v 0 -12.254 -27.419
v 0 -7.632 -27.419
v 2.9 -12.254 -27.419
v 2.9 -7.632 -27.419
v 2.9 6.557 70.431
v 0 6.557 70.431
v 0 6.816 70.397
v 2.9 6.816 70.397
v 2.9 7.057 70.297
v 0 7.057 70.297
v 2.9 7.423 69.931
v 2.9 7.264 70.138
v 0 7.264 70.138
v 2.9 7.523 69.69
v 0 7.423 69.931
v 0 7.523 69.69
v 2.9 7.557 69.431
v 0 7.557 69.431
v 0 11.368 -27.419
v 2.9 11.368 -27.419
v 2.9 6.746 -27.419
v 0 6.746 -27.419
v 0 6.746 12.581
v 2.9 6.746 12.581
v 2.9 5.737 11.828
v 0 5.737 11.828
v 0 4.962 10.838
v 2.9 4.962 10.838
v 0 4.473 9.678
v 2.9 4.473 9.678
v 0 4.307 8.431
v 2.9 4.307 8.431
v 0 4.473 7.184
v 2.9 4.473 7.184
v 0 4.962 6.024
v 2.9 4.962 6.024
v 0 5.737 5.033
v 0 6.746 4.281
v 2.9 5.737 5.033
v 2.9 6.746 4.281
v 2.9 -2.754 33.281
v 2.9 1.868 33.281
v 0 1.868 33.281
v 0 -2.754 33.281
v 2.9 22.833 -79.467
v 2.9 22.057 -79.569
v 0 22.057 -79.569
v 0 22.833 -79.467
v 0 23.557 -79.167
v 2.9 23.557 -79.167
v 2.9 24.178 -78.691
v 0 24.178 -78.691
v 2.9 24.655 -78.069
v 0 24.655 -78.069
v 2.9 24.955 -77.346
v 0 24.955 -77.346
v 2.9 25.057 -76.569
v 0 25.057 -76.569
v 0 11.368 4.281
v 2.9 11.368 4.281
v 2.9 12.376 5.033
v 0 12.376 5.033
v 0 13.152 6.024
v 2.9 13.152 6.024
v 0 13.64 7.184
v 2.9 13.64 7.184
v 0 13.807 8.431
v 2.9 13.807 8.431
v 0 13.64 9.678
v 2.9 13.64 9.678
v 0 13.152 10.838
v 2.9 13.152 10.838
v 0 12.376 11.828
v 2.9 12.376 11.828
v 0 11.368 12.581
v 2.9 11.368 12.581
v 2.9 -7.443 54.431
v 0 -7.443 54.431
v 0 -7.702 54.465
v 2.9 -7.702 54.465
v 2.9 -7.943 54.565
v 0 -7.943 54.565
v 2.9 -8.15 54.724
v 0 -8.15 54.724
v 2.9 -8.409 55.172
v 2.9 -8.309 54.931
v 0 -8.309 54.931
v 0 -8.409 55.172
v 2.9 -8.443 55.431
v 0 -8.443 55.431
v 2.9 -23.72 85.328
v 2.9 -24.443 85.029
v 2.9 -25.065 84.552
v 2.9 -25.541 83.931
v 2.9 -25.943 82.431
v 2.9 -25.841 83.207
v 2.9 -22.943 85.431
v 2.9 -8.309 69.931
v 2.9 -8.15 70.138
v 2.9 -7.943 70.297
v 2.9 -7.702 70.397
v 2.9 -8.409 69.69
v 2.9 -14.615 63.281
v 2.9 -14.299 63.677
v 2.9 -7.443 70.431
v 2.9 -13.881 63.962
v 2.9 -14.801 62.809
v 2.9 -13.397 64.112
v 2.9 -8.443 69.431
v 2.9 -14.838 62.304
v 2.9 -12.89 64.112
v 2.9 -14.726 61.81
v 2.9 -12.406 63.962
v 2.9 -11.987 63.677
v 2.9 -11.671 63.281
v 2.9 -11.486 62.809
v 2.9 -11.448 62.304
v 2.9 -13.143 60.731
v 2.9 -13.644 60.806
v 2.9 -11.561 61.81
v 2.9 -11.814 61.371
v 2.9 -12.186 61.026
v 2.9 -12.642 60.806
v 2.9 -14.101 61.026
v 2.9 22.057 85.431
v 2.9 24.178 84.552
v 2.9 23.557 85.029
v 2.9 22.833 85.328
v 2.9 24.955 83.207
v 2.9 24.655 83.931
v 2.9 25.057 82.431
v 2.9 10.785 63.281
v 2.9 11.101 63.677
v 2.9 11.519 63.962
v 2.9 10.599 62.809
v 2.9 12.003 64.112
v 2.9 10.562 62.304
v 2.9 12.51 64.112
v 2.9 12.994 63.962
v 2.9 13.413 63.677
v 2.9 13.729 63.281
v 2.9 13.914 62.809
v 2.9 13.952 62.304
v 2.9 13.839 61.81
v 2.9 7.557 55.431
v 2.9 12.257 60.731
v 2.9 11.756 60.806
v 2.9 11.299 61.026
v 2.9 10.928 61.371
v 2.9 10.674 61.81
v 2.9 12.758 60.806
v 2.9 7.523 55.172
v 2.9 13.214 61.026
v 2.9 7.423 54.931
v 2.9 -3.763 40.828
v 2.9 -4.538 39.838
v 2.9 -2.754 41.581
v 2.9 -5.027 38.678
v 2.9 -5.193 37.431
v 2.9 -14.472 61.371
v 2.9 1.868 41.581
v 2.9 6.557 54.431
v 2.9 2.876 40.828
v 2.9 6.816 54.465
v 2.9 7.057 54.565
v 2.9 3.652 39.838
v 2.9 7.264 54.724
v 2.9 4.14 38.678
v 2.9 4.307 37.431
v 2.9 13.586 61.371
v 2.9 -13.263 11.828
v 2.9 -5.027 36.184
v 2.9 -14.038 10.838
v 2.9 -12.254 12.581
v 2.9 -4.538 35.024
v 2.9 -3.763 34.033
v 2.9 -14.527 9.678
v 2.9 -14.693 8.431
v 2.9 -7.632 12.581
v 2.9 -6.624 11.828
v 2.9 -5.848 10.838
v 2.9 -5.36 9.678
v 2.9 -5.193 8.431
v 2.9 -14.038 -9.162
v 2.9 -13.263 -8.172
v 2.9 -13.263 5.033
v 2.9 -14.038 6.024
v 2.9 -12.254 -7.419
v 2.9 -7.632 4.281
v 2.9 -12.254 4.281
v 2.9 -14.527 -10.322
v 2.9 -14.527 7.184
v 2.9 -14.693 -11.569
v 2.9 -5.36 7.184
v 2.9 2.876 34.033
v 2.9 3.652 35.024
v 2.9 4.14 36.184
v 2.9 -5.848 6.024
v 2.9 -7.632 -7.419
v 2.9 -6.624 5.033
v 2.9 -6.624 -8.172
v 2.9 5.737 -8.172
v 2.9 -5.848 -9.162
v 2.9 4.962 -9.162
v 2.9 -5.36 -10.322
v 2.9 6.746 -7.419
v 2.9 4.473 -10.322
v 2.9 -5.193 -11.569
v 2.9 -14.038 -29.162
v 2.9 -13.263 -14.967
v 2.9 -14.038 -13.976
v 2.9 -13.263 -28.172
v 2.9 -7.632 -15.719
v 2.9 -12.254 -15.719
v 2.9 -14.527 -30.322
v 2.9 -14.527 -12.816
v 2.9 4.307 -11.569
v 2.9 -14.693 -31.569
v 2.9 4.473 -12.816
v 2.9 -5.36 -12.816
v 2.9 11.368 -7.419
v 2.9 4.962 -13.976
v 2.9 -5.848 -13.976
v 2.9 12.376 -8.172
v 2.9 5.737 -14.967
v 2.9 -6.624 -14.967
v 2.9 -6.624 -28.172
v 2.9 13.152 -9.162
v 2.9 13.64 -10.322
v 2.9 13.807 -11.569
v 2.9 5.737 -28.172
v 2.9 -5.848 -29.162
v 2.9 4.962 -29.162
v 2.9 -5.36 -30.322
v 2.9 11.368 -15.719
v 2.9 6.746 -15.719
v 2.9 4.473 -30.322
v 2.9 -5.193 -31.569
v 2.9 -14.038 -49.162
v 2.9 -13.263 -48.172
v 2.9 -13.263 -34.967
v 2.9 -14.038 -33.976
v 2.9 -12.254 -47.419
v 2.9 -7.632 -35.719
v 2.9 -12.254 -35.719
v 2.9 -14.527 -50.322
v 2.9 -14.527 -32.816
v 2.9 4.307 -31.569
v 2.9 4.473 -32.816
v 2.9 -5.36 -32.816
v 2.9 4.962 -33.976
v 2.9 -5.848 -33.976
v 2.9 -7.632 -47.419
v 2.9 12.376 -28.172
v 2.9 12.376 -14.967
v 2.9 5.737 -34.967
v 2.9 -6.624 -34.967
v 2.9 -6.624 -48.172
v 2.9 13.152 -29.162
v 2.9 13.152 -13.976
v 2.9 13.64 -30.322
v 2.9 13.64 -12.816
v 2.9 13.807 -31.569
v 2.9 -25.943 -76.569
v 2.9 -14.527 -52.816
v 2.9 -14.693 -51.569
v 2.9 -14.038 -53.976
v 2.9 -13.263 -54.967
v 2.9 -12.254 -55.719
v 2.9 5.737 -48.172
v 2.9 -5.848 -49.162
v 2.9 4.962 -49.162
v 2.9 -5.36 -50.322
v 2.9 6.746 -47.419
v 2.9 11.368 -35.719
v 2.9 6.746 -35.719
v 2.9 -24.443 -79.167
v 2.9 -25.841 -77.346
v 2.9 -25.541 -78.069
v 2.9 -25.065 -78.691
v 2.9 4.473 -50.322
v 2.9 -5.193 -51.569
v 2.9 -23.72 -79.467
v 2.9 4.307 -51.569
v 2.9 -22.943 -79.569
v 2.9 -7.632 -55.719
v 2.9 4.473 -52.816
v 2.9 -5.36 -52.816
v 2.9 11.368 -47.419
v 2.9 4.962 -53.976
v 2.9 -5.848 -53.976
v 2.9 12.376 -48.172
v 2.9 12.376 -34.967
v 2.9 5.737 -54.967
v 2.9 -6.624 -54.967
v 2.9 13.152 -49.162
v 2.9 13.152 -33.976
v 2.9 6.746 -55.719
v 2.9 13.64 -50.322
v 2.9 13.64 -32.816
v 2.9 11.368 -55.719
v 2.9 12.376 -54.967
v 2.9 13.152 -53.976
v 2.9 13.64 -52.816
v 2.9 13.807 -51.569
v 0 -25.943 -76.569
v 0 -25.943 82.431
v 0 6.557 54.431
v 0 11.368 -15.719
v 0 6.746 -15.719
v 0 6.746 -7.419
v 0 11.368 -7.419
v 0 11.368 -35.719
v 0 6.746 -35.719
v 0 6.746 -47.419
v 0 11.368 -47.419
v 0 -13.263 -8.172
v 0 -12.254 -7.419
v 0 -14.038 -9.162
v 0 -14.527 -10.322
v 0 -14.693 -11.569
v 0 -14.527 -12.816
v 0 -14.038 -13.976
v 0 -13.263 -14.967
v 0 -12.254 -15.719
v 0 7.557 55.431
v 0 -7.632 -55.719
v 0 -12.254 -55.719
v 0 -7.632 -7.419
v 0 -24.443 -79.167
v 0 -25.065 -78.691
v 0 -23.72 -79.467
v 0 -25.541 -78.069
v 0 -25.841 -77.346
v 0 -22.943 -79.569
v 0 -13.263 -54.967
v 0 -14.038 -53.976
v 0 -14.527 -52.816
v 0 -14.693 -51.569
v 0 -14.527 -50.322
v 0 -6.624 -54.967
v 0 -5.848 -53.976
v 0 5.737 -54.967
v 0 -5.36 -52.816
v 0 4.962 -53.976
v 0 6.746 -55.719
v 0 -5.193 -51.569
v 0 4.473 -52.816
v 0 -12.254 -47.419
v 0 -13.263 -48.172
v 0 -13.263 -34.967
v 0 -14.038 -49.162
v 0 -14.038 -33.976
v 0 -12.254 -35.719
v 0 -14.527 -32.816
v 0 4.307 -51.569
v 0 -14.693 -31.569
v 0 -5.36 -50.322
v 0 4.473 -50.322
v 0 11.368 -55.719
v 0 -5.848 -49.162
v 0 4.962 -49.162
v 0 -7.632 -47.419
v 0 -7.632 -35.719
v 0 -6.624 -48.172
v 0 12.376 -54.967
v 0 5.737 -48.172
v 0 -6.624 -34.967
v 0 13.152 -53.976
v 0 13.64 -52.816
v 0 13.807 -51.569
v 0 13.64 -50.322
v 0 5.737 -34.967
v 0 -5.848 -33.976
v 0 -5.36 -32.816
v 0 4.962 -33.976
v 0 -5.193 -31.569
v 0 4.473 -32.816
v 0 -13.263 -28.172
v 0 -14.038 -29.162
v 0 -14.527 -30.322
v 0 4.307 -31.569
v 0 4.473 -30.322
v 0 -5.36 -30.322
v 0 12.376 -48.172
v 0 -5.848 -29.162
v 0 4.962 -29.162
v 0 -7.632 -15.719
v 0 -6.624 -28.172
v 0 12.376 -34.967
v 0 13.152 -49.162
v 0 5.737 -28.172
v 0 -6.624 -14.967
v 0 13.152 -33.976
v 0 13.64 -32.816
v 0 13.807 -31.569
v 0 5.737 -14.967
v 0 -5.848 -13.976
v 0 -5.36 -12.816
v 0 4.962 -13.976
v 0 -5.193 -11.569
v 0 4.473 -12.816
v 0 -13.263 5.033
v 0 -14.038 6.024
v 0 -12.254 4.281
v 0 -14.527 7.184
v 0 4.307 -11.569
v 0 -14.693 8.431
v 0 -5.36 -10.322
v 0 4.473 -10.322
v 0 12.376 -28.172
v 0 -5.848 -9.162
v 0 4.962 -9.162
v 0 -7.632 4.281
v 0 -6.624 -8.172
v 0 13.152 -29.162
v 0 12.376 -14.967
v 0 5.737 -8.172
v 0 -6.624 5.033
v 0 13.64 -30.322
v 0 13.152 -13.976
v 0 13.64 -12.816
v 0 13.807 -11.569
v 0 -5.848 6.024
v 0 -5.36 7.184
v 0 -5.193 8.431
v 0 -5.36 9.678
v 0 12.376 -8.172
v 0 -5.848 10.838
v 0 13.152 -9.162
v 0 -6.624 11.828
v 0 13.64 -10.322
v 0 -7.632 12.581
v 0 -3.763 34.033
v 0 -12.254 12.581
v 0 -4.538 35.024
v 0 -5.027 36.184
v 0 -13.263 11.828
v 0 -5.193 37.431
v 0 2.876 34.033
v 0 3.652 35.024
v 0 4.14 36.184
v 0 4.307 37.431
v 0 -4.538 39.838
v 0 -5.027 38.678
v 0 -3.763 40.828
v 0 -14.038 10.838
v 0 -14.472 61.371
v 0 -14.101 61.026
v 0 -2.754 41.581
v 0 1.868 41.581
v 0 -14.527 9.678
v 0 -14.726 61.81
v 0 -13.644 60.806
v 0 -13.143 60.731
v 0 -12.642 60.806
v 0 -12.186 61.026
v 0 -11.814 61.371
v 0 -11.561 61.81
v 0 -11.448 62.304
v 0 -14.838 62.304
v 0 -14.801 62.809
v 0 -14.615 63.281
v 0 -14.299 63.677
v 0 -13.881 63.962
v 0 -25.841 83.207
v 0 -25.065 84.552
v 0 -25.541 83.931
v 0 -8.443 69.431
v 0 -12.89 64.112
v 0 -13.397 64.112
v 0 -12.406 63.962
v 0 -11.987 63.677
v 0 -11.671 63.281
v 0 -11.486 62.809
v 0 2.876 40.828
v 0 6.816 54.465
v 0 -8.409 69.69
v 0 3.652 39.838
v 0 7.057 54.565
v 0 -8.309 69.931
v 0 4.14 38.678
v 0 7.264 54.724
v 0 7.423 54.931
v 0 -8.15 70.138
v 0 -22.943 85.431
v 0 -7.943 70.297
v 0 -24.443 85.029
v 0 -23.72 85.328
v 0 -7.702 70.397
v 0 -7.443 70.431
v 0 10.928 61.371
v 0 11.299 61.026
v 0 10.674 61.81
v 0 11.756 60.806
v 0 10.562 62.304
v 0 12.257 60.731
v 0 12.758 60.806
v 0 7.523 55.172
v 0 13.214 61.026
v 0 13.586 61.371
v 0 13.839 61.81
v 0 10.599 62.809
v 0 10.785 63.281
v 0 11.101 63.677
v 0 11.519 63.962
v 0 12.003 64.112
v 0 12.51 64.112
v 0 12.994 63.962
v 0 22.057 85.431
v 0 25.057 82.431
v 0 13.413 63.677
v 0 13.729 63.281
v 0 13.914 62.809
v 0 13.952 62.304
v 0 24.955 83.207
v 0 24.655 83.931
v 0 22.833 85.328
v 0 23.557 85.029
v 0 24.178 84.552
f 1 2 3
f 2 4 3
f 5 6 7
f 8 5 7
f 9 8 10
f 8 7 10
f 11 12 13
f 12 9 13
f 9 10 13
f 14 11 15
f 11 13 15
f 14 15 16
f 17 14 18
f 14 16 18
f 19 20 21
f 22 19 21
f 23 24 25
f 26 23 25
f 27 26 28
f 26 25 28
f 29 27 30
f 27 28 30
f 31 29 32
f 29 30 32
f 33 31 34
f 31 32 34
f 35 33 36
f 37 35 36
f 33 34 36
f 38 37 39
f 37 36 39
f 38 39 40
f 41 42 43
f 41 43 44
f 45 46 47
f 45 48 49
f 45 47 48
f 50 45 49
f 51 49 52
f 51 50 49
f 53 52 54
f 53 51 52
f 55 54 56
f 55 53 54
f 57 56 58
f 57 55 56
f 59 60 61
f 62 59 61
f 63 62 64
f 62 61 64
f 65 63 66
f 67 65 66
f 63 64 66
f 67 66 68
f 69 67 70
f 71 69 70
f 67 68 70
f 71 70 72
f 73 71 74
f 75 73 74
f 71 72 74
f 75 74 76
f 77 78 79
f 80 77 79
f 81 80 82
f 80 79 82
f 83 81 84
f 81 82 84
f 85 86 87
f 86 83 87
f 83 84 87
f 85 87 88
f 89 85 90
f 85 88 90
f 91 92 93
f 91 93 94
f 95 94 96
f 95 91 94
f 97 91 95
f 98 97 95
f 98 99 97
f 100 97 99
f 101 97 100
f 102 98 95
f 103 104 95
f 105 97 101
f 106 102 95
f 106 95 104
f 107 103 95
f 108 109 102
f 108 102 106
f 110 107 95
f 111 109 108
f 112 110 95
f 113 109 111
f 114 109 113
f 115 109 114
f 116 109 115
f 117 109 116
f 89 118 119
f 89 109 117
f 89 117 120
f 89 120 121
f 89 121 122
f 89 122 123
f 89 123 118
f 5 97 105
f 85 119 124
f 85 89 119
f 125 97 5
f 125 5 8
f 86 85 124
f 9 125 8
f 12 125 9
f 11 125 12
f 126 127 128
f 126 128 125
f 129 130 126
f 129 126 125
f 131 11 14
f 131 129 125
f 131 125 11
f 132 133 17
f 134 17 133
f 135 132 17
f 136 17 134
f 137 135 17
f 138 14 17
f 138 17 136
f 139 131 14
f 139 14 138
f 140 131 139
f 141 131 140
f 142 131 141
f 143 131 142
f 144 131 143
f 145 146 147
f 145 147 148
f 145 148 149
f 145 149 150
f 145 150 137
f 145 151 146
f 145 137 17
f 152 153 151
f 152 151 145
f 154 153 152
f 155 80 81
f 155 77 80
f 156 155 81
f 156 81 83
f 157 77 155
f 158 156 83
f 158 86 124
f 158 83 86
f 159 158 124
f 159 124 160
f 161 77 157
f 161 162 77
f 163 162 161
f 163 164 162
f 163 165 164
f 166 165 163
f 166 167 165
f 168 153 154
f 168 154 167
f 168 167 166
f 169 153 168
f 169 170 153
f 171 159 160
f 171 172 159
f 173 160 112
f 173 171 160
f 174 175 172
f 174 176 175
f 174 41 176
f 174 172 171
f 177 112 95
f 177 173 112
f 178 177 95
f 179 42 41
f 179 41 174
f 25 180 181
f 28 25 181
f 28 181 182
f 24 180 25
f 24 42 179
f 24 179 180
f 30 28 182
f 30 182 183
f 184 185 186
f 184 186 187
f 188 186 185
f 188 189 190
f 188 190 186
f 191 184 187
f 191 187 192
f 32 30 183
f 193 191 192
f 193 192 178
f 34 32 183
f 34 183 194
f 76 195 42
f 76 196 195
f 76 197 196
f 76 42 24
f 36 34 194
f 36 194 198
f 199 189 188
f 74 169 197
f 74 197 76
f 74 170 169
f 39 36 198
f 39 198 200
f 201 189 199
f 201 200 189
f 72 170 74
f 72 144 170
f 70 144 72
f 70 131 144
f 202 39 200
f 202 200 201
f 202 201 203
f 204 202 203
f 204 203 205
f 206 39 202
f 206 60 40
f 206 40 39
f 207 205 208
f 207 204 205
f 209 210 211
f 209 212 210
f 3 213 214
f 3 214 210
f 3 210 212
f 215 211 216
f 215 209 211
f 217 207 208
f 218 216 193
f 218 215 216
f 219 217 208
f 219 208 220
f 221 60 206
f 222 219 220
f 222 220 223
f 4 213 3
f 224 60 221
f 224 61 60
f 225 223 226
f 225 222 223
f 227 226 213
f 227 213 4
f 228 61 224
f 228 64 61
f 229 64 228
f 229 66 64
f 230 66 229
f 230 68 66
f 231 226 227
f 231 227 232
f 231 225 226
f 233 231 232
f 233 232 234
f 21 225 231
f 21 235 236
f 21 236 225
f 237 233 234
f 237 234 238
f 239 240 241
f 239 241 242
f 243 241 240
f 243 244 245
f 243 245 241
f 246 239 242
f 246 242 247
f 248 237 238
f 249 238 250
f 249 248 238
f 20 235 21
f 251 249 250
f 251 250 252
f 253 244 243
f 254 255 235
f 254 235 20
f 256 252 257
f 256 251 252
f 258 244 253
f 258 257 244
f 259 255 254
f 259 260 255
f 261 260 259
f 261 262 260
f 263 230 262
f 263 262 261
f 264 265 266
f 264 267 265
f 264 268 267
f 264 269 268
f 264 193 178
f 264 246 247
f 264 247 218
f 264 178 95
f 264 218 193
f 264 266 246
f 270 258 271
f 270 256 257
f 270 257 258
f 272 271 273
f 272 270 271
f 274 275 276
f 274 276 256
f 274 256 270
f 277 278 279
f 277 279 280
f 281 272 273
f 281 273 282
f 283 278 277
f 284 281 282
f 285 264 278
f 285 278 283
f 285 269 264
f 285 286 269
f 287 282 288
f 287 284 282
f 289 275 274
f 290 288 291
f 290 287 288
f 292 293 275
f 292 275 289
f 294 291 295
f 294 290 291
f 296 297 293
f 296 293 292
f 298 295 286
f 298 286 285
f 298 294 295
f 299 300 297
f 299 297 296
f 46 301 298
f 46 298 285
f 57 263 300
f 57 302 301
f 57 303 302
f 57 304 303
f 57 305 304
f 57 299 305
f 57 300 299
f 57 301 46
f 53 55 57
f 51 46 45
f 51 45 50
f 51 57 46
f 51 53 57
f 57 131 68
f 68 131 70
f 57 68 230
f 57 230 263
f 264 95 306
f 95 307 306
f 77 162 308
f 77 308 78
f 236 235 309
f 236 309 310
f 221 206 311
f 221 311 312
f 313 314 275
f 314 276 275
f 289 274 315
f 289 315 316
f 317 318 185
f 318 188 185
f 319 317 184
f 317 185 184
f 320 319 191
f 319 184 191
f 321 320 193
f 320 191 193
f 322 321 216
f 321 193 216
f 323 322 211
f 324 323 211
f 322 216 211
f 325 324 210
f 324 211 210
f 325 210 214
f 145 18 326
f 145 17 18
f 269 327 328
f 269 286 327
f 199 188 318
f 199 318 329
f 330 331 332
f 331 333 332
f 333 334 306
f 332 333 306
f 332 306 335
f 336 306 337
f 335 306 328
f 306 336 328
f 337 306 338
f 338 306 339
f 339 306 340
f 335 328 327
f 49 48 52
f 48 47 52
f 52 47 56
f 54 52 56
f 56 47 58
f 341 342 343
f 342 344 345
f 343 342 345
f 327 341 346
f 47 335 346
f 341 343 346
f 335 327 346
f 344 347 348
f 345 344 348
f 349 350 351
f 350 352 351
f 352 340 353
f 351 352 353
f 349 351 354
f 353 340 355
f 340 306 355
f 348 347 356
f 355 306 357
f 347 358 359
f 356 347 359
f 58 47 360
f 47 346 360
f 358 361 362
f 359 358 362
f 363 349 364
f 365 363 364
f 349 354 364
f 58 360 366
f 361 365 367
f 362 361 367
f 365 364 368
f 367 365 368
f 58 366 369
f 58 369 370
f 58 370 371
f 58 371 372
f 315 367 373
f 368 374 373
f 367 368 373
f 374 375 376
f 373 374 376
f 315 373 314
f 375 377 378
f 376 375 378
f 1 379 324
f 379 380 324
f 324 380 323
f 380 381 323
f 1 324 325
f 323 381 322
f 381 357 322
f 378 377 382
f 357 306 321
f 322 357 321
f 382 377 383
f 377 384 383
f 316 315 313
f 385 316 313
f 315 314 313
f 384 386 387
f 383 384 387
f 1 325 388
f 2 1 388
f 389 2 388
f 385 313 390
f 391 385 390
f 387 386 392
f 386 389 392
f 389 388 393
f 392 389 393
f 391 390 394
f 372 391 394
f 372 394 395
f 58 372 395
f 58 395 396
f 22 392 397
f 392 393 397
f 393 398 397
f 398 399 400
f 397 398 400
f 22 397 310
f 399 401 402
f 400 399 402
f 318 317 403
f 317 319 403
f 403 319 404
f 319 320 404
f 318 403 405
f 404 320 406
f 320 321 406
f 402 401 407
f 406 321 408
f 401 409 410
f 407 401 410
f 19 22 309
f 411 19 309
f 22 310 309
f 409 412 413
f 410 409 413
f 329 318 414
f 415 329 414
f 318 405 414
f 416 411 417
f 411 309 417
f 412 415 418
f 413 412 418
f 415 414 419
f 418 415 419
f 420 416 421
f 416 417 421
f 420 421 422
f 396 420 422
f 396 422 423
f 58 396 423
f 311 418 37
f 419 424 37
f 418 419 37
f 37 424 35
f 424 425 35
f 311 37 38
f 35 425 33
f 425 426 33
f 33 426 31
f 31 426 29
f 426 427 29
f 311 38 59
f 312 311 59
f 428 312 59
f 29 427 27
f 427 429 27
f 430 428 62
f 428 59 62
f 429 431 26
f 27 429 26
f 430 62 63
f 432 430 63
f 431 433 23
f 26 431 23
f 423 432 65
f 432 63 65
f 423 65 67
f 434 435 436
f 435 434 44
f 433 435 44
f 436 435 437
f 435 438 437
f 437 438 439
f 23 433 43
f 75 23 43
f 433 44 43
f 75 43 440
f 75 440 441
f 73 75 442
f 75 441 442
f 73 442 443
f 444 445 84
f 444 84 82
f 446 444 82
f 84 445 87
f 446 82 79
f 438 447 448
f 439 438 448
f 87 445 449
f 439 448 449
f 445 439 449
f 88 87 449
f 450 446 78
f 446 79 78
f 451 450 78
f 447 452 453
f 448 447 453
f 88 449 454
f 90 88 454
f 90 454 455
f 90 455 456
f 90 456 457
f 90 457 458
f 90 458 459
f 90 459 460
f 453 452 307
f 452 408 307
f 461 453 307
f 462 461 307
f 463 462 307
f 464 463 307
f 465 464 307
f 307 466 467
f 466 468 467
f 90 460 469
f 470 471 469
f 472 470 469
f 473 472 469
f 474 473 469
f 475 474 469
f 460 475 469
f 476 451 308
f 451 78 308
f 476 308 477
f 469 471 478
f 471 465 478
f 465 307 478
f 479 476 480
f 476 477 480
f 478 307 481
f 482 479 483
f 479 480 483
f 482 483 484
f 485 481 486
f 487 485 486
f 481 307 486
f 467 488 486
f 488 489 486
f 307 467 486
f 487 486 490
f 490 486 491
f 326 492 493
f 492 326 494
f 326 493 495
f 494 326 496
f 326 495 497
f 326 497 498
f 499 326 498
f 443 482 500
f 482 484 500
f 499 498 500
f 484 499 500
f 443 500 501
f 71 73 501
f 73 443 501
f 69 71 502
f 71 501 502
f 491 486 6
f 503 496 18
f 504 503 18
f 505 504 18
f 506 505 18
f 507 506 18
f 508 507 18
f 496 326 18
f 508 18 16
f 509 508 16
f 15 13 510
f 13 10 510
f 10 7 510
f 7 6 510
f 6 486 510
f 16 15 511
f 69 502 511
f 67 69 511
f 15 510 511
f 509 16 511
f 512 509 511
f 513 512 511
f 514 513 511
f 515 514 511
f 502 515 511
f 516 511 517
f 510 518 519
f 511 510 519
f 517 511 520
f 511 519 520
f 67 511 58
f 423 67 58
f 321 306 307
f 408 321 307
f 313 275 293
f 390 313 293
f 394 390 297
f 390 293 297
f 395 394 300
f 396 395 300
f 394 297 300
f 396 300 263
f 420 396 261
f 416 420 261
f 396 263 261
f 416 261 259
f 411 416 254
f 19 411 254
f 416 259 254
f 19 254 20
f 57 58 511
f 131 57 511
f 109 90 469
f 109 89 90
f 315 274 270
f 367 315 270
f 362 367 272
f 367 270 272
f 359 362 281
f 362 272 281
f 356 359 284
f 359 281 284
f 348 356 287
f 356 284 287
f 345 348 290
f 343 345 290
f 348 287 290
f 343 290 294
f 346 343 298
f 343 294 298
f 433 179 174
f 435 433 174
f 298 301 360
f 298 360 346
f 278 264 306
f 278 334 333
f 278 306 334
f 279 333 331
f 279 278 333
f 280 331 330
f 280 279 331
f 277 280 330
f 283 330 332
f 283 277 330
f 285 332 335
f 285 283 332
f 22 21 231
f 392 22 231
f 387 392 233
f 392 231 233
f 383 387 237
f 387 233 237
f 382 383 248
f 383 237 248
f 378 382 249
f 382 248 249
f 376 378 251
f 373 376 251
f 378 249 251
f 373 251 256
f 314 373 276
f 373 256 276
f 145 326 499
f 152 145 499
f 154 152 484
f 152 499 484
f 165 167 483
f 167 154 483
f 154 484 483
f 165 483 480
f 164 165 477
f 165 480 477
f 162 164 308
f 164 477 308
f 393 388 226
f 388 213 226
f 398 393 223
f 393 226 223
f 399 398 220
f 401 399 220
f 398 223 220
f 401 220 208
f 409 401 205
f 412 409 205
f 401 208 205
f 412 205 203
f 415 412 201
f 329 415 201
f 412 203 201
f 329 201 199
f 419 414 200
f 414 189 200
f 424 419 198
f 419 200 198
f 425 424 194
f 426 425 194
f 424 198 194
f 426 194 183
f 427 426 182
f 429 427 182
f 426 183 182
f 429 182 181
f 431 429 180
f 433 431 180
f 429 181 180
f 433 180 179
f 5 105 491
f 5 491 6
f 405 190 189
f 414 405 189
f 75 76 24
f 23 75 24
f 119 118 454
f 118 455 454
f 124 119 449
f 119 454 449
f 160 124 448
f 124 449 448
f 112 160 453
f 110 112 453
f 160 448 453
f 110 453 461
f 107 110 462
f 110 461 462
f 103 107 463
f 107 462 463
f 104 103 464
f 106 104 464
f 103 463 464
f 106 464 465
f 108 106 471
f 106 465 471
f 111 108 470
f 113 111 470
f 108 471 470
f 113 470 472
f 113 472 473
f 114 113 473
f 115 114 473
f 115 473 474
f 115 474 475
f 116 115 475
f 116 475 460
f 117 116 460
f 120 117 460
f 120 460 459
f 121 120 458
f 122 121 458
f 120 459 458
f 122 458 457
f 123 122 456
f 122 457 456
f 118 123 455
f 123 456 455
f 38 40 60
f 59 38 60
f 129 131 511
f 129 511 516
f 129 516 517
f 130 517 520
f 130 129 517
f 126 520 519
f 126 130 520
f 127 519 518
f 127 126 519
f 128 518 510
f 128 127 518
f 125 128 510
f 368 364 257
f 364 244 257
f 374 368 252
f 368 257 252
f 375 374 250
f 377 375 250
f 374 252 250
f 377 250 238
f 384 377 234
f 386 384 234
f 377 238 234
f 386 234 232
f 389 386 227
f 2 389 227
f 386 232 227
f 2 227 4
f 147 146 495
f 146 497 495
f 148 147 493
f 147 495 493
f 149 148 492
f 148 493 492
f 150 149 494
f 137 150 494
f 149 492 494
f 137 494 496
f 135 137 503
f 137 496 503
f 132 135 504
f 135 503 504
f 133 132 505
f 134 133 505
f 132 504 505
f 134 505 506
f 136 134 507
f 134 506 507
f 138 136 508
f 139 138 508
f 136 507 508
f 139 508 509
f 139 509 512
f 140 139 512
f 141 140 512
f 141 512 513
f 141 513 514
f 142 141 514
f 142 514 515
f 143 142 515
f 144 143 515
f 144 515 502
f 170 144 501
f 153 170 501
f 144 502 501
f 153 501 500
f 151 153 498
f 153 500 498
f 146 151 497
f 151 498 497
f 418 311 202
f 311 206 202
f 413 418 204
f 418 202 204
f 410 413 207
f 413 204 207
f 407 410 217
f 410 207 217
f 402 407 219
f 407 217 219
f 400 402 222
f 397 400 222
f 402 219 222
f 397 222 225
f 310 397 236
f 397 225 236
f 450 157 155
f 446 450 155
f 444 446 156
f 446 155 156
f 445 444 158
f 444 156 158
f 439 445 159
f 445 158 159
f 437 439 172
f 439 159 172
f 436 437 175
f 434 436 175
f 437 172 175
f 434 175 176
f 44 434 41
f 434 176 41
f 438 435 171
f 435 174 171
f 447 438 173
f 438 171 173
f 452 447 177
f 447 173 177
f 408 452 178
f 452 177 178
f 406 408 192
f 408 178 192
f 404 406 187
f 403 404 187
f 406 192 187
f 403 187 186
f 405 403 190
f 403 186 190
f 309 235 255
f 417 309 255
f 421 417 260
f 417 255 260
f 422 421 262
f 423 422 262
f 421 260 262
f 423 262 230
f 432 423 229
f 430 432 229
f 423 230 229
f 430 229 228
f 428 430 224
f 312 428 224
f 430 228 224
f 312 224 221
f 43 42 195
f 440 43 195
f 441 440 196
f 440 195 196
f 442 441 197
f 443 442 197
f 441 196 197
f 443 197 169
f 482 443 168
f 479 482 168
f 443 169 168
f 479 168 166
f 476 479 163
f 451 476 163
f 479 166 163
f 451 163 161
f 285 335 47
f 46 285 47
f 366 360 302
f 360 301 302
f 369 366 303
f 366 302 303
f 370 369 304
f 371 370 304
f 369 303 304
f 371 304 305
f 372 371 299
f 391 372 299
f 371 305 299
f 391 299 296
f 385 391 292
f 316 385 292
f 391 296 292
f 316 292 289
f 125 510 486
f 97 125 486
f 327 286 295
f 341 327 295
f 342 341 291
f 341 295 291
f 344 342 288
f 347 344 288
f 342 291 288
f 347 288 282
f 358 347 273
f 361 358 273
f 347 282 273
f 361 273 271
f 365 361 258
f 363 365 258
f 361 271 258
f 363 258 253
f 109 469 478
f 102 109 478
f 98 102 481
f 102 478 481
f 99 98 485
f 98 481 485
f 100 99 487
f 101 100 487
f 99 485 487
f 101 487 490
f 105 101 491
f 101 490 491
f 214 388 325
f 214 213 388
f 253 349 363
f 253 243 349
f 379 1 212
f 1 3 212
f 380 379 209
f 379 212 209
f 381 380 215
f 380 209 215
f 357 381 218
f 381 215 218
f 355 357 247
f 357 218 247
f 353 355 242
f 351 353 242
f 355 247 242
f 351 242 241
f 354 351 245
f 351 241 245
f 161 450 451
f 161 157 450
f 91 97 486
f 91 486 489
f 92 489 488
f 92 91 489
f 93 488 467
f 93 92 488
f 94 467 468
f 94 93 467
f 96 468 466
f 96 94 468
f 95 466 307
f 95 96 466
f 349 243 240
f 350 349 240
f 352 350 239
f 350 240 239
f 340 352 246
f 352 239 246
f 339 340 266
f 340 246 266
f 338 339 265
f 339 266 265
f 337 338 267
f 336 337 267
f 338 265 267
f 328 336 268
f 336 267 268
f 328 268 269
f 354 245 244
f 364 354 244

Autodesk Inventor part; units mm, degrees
ref_plane "YZ Plane" through (0, 0, 0) normal (1, 0, 0) x (0, 1, 0)
ref_plane "XZ Plane" through (0, 0, 0) normal (0, 1, 0) x (-1, 0, 0)
ref_plane "XY Plane" through (0, 0, 0) normal (0, 0, 1) x (1, 0, 0)
sketch "Sketch1" plane through (0, 0, 0) normal (1, 0, 0) x (0, 1, 0)
  line L0 (25.0568, 85.4307) -> (-25.9432, 85.4307)
  line L1 (-25.9432, 85.4307) -> (-25.9432, -79.5693)
  line L2 (-25.9432, -79.5693) -> (25.0568, -79.5693)
  line L3 (25.0568, -79.5693) -> (25.0568, 85.4307)
  point P0 (0, 0)
  dimension "d0" = 165
  dimension "d1" = 51
extrude "Extrusion1" add sketch "Sketch1" along normal blind 3
fillet "Fillet1" radius 3 4 edges at (1.5, 25.0568, 85.4307) (1.5, -25.9432, 85.4307) (1.5, 25.0568, -79.5693) (1.5, -25.9432, -79.5693)
sketch "Sketch2" plane through (3, 0, 0) normal (1, 0, 0) x (0, 0, -1)
  line L0 (-77.4307, 22.0568) -> (71.5693, 22.0568)
  line L1 (71.5693, 22.0568) -> (71.5693, -22.9432)
  line L2 (71.5693, -22.9432) -> (-77.4307, -22.9432)
  line L3 (-77.4307, -22.9432) -> (-77.4307, 22.0568)
  line L4 (-85.4307, 22.0568) -> (-85.4307, -22.9432) projected
  line L5 (79.5693, -22.9432) -> (79.5693, 22.0568) projected
  line L6 (-82.4307, -25.9432) -> (76.5693, -25.9432) projected
  line L7 (76.5693, 25.0568) -> (-82.4307, 25.0568) projected
  point P0 (0, 0)
  dimension "d5" = 149
  dimension "d6" = 45
  dimension "d9" = 165
  dimension "d10" = 8
  dimension "d11" = 51
  dimension "d12" = 3
extrude "Extrusion2" cut sketch "Sketch2" against normal blind 0.1
sketch "Sketch4" plane through (2.9, 0, 0) normal (1, 0, 0) x (0, 0, -1)
  line L0 (-77.4307, 22.0568) -> (71.5693, 22.0568)
  line L1 (71.5693, 22.0568) -> (71.5693, -22.9432)
  line L2 (71.5693, -22.9432) -> (-77.4307, -22.9432)
  line L3 (-77.4307, -22.9432) -> (-77.4307, 22.0568)
  line L4 (-41.5807, 1.8676) -> (-33.2807, 1.8676)
  line L5 (-33.2807, 1.8676) -> (-33.2807, -2.7541)
  line L6 (-33.2807, -2.7541) -> (-41.5807, -2.7541)
  line L7 (-41.5807, -2.7541) -> (-41.5807, 1.8676)
  line L8 (-41.5807, 1.8676) -> (-33.2807, -2.7541) construction
  line L9 (-33.2807, 1.8676) -> (-41.5807, -2.7541) construction
  arc A0 (-33.2807, 1.8676) -> (-41.5807, 1.8676) centre (-37.4307, -0.4432) ccw
  line L10 (-12.5807, 6.7459) -> (-4.2807, 6.7459)
  line L11 (-4.2807, 6.7459) -> (-4.2807, 11.3676)
  line L12 (-4.2807, 11.3676) -> (-12.5807, 11.3676)
  line L13 (-12.5807, 11.3676) -> (-12.5807, 6.7459)
  line L14 (-12.5807, 6.7459) -> (-4.2807, 11.3676) construction
  line L15 (-4.2807, 6.7459) -> (-12.5807, 11.3676) construction
  arc A1 (-4.2807, 11.3676) -> (-12.5807, 11.3676) centre (-8.4307, 9.0568) ccw
  arc A2 (-12.5807, 6.7459) -> (-4.2807, 6.7459) centre (-8.4307, 9.0568) ccw
  line L16 (7.4193, 11.3676) -> (15.7193, 11.3676)
  line L17 (15.7193, 11.3676) -> (15.7193, 6.7459)
  line L18 (15.7193, 6.7459) -> (7.4193, 6.7459)
  line L19 (7.4193, 6.7459) -> (7.4193, 11.3676)
  line L20 (7.4193, 11.3676) -> (15.7193, 6.7459) construction
  line L21 (15.7193, 11.3676) -> (7.4193, 6.7459) construction
  arc A3 (15.7193, 11.3676) -> (7.4193, 11.3676) centre (11.5693, 9.0568) ccw
  arc A4 (7.4193, 6.7459) -> (15.7193, 6.7459) centre (11.5693, 9.0568) ccw
  line L22 (27.4193, 6.7459) -> (35.7193, 6.7459)
  line L23 (35.7193, 6.7459) -> (35.7193, 11.3676)
  line L24 (35.7193, 11.3676) -> (27.4193, 11.3676)
  line L25 (27.4193, 11.3676) -> (27.4193, 6.7459)
  line L26 (27.4193, 6.7459) -> (35.7193, 11.3676) construction
  line L27 (35.7193, 6.7459) -> (27.4193, 11.3676) construction
  line L28 (55.7193, -12.2541) -> (47.4193, -12.2541)
  line L29 (47.4193, -12.2541) -> (47.4193, -7.6324)
  line L30 (47.4193, -7.6324) -> (55.7193, -7.6324)
  line L31 (55.7193, -7.6324) -> (55.7193, -12.2541)
  line L32 (55.7193, -12.2541) -> (47.4193, -7.6324) construction
  line L33 (47.4193, -12.2541) -> (55.7193, -7.6324) construction
  line L34 (27.4193, -12.2541) -> (35.7193, -12.2541)
  line L35 (35.7193, -12.2541) -> (35.7193, -7.6324)
  line L36 (35.7193, -7.6324) -> (27.4193, -7.6324)
  line L37 (27.4193, -7.6324) -> (27.4193, -12.2541)
  line L38 (27.4193, -12.2541) -> (35.7193, -7.6324) construction
  line L39 (35.7193, -12.2541) -> (27.4193, -7.6324) construction
  line L40 (15.7193, -12.2541) -> (7.4193, -12.2541)
  line L41 (7.4193, -12.2541) -> (7.4193, -7.6324)
  line L42 (7.4193, -7.6324) -> (15.7193, -7.6324)
  line L43 (15.7193, -7.6324) -> (15.7193, -12.2541)
  line L44 (15.7193, -12.2541) -> (7.4193, -7.6324) construction
  line L45 (7.4193, -12.2541) -> (15.7193, -7.6324) construction
  line L46 (-12.5807, -12.2541) -> (-4.2807, -12.2541)
  line L47 (-4.2807, -12.2541) -> (-4.2807, -7.6324)
  line L48 (-4.2807, -7.6324) -> (-12.5807, -7.6324)
  line L49 (-12.5807, -7.6324) -> (-12.5807, -12.2541)
  line L50 (-12.5807, -12.2541) -> (-4.2807, -7.6324) construction
  line L51 (-4.2807, -12.2541) -> (-12.5807, -7.6324) construction
  arc A5 (-4.2807, -7.6324) -> (-12.5807, -7.6324) centre (-8.4307, -9.9432) ccw
  arc A6 (-12.5807, -12.2541) -> (-4.2807, -12.2541) centre (-8.4307, -9.9432) ccw
  arc A7 (15.7193, -7.6324) -> (7.4193, -7.6324) centre (11.5693, -9.9432) ccw
  arc A8 (7.4193, -12.2541) -> (15.7193, -12.2541) centre (11.5693, -9.9432) ccw
  arc A9 (35.7193, -7.6324) -> (27.4193, -7.6324) centre (31.5693, -9.9432) ccw
  arc A10 (27.4193, -12.2541) -> (35.7193, -12.2541) centre (31.5693, -9.9432) ccw
  arc A11 (55.7193, -7.6324) -> (47.4193, -7.6324) centre (51.5693, -9.9432) ccw
  arc A12 (47.4193, -12.2541) -> (55.7193, -12.2541) centre (51.5693, -9.9432) ccw
  arc A13 (35.7193, 11.3676) -> (27.4193, 11.3676) centre (31.5693, 9.0568) ccw
  arc A14 (27.4193, 6.7459) -> (35.7193, 6.7459) centre (31.5693, 9.0568) ccw
  line L52 (55.7193, 6.7459) -> (47.4193, 6.7459)
  line L53 (47.4193, 6.7459) -> (47.4193, 11.3676)
  line L54 (47.4193, 11.3676) -> (55.7193, 11.3676)
  line L55 (55.7193, 11.3676) -> (55.7193, 6.7459)
  line L56 (55.7193, 6.7459) -> (47.4193, 11.3676) construction
  line L57 (47.4193, 6.7459) -> (55.7193, 11.3676) construction
  arc A15 (55.7193, 11.3676) -> (47.4193, 11.3676) centre (51.5693, 9.0568) ccw
  arc A16 (47.4193, 6.7459) -> (55.7193, 6.7459) centre (51.5693, 9.0568) ccw
  arc A17 (-41.5807, -2.7541) -> (-33.2807, -2.7541) centre (-37.4307, -0.4432) ccw
  line L58 (-70.4307, -8.4432) -> (-70.4307, 7.5568)
  line L59 (-70.4307, 7.5568) -> (-54.4307, 7.5568)
  line L60 (-54.4307, 7.5568) -> (-54.4307, -8.4432)
  line L61 (-54.4307, -8.4432) -> (-70.4307, -8.4432)
  line L62 (-70.4307, -8.4432) -> (-54.4307, 7.5568) construction
  line L63 (-70.4307, 7.5568) -> (-54.4307, -8.4432) construction
  point P0 (0, 0)
  point P1 (-62.4307, -0.4432)
  point P2 (-62.4307, -13.1432)
  point P3 (-62.4307, 12.2568)
  dimension "d16" = 20
  dimension "d17" = 20
  dimension "d18" = 20
  dimension "d20" = 19
  dimension "d25" = 20
  dimension "d26" = 20
  dimension "d27" = 20
  dimension "d28" = 19
  dimension "d29" = 19
  dimension "d43" = 13
  dimension "d44" = 45
  dimension "d45" = 13
  dimension "d46" = 13
  dimension "d47" = 13
  dimension "d70" = 22.5
  dimension "d71" = 8.3
  dimension "d72" = 4.75
  dimension "d73" = 40
  dimension "d74" = 20.1892
  dimension "d75" = 8.3
  dimension "d76" = 4.75
  dimension "d77" = 8.3
  dimension "d78" = 4.75
  dimension "d79" = 8.3
  dimension "d81" = 8.3
  dimension "d82" = 8.3
  dimension "d83" = 8.3
  dimension "d84" = 8.3
  dimension "d85" = 4.75
  dimension "d86" = 4.75
  dimension "d88" = 4.75
  dimension "d90" = 4.75
  dimension "d98" = 20
  dimension "d100" = 20
  dimension "d101" = 8.3
  dimension "d104" = 16
  dimension "d105" = 16
  dimension "d106" = 15
  dimension "d107" = 22.5
  dimension "d108" = 8
  dimension "d109" = 8
  dimension "d110" = 12.7
  dimension "d111" = 12.7
extrude "Extrusion3" cut sketch "Sketch4" against normal blind 20 contours A0 L4 | L4 L5 L6 L7 | L6 A17 | L13 L12 L11 L10 | L10 A2 | A1 L12 | A3 L16 | L16 L17 L18 L19 | L18 A4 | L25 L24 L23 L22 | L22 A14 | A13 L24 | A12 L28 | L28 L29 L30 L31 | L30 A11 | L37 L36 L35 L34 | L34 A10 | A9 L36 | A8 L40 | L40 L41 L42 L43 | L42 A7 | L49 L48 L47 L46 | L46 A6 | A5 L48 | A16 L52 | L52 L53 L54 L55 | L54 A15 | L58 L59 L60 L61
fillet "Fillet2" radius 1 4 edges at (1.45, 7.5568, 54.4307) (1.45, -8.4432, 54.4307) (1.45, -8.4432, 70.4307) (1.45, 7.5568, 70.4307)
hole "Hole4" at (2.9, -0.4432, 37.4307) at (2.9, 9.0568, -11.5693) at (2.9, 9.0568, 8.4307) at (2.9, 9.0568, -31.5693) at (2.9, 9.0568, -51.5693) at (2.9, -9.9432, 8.4307) at (2.9, -9.9432, -11.5693) at (2.9, -9.9432, -31.5693) at (2.9, -9.9432, -51.5693) at (2.9, -13.1432, 62.4307) at (2.9, 12.2568, 62.4307) direction (-1, 0, 0) diameter 3.4 end through all clearance for "Flat Head Machine Screw" size "M3" standard "Ansi Metric M Profile"
sketch "Sketch9" plane through (3, 0, 0) normal (1, 0, 0) x (0, 0, -1)
  line L0 (-77.4307, -22.9432) -> (-77.4307, 22.0568) projected
  line L1 (-77.4307, 22.0568) -> (71.5693, 22.0568) projected
  line L2 (71.5693, 22.0568) -> (71.5693, -22.9432) projected
  line L3 (71.5693, -22.9432) -> (-77.4307, -22.9432) projected
  arc A0 (76.5693, -25.9432) -> (79.5693, -22.9432) centre (76.5693, -22.9432) ccw projected
  line L4 (79.5693, -22.9432) -> (79.5693, 22.0568) projected
  arc A1 (79.5693, 22.0568) -> (76.5693, 25.0568) centre (76.5693, 22.0568) ccw projected
  line L5 (76.5693, 25.0568) -> (-82.4307, 25.0568) projected
  arc A2 (-82.4307, 25.0568) -> (-85.4307, 22.0568) centre (-82.4307, 22.0568) ccw projected
  line L6 (-85.4307, 22.0568) -> (-85.4307, -22.9432) projected
  arc A3 (-85.4307, -22.9432) -> (-82.4307, -25.9432) centre (-82.4307, -22.9432) ccw projected
  line L7 (-82.4307, -25.9432) -> (76.5693, -25.9432) projected
  point P0 (0, 0)
extrude "Extrusion4" cut sketch "Sketch9" against normal blind 0.1
equation "\"d10\" = -0.5 * d5 + 0.5 * d9"
equation "\"d12\" = -0.5 * d6 + 0.5 * d11"
equation "\"d25\" = d16"
equation "\"d26\" = d17"
equation "\"d27\" = d18"
equation "\"d28\" = d20"
equation "\"d29\" = d28"
equation "\"d43\" = -0.5 * d20 + 0.5 * d44"
equation "\"d45\" = d43"
equation "\"d46\" = d45"
equation "\"d47\" = d46"
equation "\"d78\" = d76"
equation "\"d85\" = d76"
equation "\"d86\" = d85"
equation "\"d88\" = d86"
equation "\"d90\" = d78"
properties part number "Front-panel"
